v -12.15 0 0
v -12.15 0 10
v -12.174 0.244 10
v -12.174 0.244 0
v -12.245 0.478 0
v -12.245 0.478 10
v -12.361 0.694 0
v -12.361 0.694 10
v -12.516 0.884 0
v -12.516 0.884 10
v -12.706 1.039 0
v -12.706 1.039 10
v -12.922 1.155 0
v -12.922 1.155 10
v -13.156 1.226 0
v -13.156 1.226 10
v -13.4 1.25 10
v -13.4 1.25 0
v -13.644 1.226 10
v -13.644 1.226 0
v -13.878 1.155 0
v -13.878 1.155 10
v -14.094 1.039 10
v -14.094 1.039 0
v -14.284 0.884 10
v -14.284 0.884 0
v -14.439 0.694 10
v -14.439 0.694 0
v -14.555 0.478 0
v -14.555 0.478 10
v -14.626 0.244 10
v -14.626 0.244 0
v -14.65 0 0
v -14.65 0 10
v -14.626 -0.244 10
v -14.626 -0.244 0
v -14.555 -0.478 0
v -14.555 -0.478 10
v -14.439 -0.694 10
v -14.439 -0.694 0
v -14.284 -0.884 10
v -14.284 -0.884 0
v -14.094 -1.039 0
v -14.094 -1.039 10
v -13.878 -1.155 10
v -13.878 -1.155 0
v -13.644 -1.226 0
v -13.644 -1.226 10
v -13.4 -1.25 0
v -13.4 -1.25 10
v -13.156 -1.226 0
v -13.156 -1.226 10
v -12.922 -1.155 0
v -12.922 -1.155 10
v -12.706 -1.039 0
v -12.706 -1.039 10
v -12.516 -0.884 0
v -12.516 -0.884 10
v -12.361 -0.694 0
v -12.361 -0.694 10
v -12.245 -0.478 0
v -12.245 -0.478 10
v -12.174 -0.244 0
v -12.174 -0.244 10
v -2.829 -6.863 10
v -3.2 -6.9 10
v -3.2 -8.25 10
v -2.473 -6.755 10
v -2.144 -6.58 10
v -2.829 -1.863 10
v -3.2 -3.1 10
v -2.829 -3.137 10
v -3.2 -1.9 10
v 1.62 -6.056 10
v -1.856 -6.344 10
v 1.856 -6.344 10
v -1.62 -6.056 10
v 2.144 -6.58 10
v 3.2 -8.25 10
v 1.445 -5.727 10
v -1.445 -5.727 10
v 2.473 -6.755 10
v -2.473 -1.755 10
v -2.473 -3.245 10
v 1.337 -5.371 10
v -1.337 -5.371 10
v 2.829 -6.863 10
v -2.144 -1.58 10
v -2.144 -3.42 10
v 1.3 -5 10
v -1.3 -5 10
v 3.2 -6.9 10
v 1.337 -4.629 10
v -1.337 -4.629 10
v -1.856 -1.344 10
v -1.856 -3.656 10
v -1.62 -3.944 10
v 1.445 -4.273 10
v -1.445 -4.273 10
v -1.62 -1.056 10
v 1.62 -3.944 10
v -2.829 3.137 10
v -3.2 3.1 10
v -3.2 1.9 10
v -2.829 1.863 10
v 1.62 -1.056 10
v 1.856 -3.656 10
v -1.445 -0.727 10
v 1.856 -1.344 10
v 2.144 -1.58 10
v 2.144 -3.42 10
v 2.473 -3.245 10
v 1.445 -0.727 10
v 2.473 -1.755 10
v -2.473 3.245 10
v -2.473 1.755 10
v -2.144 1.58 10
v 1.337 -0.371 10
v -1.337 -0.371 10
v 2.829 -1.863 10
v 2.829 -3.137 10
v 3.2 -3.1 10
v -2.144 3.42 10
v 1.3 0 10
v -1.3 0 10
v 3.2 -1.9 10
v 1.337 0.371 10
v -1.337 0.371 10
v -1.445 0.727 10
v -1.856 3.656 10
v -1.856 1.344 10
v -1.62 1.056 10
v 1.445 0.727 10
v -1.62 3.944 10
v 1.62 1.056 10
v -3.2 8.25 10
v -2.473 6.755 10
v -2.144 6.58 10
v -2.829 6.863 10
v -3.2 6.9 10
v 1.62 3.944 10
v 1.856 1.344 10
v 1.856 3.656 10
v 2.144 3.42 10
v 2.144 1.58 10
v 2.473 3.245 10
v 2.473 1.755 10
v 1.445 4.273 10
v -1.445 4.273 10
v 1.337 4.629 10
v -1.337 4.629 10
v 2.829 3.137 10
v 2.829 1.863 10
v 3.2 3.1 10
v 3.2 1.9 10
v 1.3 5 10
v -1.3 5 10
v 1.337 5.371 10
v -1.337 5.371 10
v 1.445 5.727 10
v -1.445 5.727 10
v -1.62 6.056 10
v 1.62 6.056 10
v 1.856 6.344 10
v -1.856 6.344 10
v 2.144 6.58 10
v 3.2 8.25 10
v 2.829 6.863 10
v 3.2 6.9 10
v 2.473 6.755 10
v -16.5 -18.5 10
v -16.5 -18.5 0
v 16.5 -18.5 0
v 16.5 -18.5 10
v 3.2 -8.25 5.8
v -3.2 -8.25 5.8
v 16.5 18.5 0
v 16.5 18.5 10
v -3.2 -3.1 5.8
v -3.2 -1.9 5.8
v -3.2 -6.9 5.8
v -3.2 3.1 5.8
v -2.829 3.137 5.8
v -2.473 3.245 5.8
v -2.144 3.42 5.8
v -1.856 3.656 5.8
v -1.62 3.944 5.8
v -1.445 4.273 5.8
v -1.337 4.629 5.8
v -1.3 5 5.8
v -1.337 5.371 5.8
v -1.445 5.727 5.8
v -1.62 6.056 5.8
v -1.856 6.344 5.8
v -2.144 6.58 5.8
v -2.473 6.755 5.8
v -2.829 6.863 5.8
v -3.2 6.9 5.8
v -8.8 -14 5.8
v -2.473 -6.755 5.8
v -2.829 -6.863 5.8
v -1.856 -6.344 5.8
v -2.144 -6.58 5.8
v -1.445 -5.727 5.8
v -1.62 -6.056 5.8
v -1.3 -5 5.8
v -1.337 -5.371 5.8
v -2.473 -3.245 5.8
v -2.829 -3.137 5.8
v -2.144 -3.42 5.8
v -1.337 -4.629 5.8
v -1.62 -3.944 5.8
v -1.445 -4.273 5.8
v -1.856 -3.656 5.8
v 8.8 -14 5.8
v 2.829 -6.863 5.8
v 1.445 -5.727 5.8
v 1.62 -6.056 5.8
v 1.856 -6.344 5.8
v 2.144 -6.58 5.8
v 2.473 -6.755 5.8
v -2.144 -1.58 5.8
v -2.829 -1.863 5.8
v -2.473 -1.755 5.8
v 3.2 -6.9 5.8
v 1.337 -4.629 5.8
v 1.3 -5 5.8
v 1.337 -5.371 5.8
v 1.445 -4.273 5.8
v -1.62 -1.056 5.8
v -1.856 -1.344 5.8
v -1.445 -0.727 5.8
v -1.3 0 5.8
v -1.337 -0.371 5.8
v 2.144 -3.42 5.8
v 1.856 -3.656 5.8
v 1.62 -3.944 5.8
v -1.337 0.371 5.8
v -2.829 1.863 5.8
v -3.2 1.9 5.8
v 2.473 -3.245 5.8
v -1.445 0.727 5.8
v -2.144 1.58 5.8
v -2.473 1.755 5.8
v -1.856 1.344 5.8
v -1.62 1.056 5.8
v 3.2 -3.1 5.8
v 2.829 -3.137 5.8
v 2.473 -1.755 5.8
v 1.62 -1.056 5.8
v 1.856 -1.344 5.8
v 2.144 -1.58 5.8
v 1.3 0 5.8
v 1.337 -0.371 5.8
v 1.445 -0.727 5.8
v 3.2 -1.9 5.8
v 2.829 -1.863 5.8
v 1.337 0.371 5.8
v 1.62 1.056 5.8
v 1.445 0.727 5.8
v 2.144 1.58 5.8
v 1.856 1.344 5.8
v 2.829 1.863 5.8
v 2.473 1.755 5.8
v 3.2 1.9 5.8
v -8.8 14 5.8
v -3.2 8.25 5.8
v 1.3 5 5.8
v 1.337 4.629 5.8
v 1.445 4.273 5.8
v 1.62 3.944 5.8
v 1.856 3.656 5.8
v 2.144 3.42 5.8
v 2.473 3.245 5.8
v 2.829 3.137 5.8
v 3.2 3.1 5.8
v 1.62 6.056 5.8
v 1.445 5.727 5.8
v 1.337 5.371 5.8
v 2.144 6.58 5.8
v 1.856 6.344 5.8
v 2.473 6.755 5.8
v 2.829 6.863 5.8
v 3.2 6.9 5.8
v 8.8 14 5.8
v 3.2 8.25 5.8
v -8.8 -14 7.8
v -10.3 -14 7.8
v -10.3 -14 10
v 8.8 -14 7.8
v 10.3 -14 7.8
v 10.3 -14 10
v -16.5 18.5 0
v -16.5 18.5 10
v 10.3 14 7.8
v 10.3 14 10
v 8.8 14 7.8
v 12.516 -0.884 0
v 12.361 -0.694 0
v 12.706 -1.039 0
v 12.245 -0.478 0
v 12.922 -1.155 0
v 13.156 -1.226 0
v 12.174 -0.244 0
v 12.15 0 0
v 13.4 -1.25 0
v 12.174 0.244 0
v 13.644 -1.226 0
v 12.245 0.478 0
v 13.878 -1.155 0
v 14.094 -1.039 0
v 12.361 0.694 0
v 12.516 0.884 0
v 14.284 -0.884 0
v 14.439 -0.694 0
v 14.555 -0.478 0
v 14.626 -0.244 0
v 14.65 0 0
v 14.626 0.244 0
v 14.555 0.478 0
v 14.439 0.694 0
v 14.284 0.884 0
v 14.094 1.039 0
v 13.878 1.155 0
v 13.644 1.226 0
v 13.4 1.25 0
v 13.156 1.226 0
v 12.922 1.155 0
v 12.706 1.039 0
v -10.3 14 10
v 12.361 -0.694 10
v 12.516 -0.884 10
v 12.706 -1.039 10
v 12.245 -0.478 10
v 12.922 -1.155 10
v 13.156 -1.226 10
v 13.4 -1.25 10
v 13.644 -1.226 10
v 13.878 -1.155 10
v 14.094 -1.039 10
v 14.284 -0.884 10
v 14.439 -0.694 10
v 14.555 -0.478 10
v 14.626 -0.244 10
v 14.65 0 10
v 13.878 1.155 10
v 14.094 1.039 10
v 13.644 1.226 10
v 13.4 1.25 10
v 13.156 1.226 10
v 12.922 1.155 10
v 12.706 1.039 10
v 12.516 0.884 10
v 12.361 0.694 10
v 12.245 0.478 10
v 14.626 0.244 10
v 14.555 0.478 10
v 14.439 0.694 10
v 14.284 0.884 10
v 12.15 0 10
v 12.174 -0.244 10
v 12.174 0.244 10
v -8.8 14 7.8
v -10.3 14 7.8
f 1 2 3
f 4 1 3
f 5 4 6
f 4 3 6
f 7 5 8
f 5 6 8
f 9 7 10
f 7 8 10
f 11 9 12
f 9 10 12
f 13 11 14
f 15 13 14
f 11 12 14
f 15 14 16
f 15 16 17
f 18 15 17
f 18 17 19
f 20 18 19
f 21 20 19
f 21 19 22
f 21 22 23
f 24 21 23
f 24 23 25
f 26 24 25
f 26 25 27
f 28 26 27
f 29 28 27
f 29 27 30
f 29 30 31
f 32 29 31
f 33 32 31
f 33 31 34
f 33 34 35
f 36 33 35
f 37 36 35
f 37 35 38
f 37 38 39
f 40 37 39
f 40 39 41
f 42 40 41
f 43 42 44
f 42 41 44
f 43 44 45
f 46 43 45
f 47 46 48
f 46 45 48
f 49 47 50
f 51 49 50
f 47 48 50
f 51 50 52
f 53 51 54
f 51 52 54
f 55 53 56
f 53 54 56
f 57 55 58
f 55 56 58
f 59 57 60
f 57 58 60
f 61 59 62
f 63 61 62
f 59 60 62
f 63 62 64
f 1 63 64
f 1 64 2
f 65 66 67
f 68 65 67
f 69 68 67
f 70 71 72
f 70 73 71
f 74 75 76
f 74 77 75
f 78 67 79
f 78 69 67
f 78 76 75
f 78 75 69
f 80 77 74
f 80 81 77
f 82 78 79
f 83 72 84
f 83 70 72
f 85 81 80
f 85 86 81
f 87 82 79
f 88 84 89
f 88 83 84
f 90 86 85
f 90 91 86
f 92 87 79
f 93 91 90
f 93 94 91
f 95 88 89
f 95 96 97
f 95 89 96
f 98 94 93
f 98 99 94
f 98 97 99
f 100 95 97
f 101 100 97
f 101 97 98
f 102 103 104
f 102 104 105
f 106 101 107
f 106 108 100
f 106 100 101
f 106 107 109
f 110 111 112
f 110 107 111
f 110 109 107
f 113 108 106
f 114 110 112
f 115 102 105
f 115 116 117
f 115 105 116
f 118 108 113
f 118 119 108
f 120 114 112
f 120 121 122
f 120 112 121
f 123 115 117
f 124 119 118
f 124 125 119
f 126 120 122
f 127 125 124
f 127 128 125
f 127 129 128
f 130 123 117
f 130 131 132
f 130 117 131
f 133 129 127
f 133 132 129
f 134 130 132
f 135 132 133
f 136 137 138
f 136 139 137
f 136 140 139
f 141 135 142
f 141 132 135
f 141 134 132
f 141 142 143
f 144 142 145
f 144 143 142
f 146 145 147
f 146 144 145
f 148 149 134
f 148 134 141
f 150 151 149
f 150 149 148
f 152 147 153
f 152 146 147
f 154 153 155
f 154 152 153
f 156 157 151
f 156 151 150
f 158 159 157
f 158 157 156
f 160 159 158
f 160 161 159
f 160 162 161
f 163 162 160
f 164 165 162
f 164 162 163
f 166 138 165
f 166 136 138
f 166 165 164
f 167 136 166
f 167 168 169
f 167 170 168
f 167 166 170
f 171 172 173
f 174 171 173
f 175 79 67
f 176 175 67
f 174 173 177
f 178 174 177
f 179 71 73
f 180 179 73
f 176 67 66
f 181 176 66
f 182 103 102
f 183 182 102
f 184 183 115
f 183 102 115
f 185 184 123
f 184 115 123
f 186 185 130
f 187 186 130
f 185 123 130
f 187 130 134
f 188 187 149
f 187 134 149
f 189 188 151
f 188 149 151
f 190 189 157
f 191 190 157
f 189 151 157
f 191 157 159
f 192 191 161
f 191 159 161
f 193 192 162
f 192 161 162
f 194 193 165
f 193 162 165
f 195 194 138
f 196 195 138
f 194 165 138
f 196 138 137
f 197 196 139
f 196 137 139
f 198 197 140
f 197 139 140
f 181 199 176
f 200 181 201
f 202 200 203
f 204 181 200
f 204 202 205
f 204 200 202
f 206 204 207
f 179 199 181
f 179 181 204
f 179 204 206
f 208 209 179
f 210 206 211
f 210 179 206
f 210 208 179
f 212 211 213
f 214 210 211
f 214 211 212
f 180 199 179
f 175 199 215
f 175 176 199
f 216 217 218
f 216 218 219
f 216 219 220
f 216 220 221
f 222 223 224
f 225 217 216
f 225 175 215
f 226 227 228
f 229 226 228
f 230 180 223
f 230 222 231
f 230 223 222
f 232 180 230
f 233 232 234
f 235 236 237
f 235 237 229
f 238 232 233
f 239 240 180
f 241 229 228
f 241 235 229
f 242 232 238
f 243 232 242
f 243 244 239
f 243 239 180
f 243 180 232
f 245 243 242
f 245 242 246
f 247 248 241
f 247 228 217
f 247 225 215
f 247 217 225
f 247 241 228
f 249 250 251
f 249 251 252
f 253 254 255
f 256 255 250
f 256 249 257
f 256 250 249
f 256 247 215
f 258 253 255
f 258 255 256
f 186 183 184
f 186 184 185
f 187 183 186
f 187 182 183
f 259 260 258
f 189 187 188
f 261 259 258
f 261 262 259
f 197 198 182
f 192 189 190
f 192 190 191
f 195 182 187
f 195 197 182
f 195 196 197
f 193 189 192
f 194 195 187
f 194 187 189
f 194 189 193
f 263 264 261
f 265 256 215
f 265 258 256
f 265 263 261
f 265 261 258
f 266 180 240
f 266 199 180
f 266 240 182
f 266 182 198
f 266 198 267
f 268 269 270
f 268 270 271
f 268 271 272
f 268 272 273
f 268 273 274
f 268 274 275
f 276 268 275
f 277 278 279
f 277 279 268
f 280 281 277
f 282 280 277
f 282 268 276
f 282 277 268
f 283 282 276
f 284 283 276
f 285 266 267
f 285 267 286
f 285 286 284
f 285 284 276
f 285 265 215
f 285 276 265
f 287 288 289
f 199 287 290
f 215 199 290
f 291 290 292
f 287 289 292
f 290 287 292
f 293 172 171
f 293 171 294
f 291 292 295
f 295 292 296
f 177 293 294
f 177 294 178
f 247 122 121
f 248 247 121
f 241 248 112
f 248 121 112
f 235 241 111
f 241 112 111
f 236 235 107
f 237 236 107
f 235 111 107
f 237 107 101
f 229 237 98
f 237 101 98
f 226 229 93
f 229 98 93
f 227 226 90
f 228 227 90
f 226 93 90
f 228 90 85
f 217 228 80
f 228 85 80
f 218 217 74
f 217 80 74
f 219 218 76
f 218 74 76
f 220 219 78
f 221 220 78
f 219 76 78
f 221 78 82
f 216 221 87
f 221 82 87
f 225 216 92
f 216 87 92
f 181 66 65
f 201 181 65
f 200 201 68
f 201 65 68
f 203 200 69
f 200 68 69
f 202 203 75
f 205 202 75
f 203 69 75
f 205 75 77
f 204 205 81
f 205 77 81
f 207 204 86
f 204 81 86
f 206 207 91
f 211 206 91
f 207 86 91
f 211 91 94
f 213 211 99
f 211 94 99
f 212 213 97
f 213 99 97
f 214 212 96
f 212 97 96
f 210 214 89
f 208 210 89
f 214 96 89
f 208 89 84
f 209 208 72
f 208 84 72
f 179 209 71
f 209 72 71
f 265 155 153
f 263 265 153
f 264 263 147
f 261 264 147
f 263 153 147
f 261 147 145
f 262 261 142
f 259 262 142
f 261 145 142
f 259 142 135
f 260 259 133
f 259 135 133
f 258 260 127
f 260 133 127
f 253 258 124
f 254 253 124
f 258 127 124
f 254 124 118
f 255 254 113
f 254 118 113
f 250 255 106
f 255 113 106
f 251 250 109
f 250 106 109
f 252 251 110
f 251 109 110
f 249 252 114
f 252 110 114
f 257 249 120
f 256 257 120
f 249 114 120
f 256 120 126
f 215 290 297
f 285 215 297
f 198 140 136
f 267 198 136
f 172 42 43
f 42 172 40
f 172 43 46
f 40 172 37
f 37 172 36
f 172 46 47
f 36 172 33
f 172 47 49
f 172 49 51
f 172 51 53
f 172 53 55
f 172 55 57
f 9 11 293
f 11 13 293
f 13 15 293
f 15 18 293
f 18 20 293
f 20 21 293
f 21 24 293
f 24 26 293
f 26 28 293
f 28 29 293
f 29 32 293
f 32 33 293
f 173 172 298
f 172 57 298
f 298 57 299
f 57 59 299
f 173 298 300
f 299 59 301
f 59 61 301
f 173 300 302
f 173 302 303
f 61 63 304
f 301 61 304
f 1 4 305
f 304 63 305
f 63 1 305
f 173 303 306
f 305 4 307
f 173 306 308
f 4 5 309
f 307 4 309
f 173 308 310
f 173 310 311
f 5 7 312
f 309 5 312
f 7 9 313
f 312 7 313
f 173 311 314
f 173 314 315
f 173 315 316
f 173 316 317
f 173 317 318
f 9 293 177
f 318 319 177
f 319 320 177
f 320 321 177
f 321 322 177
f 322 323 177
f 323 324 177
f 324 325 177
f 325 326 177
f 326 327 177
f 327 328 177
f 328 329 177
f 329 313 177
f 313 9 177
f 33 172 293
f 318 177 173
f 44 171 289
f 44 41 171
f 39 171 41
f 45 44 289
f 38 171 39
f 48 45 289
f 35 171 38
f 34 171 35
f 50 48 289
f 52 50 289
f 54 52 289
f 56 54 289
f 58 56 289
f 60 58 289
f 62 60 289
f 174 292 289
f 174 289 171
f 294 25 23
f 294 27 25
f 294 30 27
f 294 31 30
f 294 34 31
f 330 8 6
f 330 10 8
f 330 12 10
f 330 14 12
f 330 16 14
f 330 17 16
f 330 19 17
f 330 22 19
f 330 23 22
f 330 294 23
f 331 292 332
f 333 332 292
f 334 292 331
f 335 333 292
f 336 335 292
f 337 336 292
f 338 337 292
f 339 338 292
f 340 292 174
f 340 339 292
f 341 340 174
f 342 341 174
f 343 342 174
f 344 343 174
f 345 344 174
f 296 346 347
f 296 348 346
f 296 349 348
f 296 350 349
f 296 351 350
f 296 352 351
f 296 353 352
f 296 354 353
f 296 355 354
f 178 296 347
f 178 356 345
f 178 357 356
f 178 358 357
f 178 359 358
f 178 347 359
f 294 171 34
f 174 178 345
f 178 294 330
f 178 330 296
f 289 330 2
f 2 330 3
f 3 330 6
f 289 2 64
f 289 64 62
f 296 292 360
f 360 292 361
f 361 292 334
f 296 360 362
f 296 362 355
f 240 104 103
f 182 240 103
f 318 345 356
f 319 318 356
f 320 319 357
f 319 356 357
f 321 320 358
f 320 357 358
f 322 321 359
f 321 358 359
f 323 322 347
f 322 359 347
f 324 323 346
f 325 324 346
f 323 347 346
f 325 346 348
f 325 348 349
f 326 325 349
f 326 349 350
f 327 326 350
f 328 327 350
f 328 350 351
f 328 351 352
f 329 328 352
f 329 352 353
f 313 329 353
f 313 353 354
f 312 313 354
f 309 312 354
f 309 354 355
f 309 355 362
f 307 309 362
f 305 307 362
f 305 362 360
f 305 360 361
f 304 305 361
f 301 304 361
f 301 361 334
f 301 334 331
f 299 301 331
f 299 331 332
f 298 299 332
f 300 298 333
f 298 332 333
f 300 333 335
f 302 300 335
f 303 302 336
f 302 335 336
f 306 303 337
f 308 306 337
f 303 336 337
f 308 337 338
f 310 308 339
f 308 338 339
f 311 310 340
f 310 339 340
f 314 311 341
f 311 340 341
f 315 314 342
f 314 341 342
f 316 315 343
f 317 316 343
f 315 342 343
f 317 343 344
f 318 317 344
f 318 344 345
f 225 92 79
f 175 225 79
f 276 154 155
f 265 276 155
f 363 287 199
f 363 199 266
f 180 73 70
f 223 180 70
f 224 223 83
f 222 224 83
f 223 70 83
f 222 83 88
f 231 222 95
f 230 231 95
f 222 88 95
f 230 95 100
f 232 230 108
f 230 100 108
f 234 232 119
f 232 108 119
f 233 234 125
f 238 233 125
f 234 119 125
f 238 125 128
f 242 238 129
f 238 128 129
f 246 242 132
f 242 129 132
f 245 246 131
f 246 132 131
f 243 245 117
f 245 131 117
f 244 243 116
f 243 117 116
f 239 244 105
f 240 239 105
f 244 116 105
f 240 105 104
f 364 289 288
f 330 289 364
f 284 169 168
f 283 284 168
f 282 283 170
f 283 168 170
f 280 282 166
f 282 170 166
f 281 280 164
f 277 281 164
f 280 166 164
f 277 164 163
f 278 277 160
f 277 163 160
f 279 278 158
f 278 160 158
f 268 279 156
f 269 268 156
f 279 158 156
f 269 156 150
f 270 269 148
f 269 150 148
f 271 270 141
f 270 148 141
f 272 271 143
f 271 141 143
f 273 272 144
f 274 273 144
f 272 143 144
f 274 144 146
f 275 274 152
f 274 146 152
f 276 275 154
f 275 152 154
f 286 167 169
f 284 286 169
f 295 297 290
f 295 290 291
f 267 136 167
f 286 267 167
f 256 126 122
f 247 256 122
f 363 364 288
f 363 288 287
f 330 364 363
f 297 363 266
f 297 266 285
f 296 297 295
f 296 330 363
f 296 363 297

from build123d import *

# Parameters (mm, degrees)
F0_W     = 33
F0_H     = 37
F1_DEPTH = 10
F2_W     = 17.6
F2_H     = 28
F3_DEPTH = 4.2
F4_W     = 1.5
F4_H     = 28
F5_DEPTH = 2.2
F6_R     = 1.25
F7_DEPTH = 10.001


with BuildPart() as f1:
    # F0 (on Top) → F1 (new body)
    with BuildSketch(Plane.XY):
        Rectangle(F0_W, F0_H)
    extrude(amount=F1_DEPTH)

    # F2 (on face) → F3 (cut)
    with BuildSketch(Plane.XY.offset(10)):
        Rectangle(F2_W, F2_H)
        with BuildLine():
            Line((3.2, -6.9), (3.2, -8.25))
            Line((3.2, -8.25), (-3.2, -8.25))
            Line((-3.2, -8.25), (-3.2, -6.9))
            ThreePointArc((-3.2, -6.9), (-1.3, -5), (-3.2, -3.1))
            Line((-3.2, -3.1), (-3.2, -1.9))
            ThreePointArc((-3.2, -1.9), (-1.3, 0), (-3.2, 1.9))
            Line((-3.2, 1.9), (-3.2, 3.1))
            ThreePointArc((-3.2, 3.1), (-1.3, 5), (-3.2, 6.9))
            Line((-3.2, 6.9), (-3.2, 8.25))
            Line((-3.2, 8.25), (3.2, 8.25))
            Line((3.2, 8.25), (3.2, 6.9))
            ThreePointArc((3.2, 6.9), (1.3, 5), (3.2, 3.1))
            Line((3.2, 3.1), (3.2, 1.9))
            ThreePointArc((3.2, 1.9), (1.3, 0), (3.2, -1.9))
            Line((3.2, -1.9), (3.2, -3.1))
            ThreePointArc((3.2, -3.1), (1.3, -5), (3.2, -6.9))
        make_face(mode=Mode.SUBTRACT)
    extrude(amount=-F3_DEPTH, mode=Mode.SUBTRACT)

    # F4 (on face) → F5 (cut)
    with BuildSketch(Plane.XY.offset(10)):
        with Locations((-9.55, 0)):
            Rectangle(F4_W, F4_H)
        with Locations((9.55, 0)):
            Rectangle(F4_W, F4_H)
    extrude(amount=-F5_DEPTH, mode=Mode.SUBTRACT)

    # F6 (on face) → F7 (cut, through all)
    with BuildSketch(Plane.XY.offset(10)):
        with Locations((13.4, 0)):
            Circle(F6_R)
        with Locations((-13.4, 0)):
            Circle(F6_R)
    extrude(amount=-F7_DEPTH, mode=Mode.SUBTRACT)


solid = f1.part
